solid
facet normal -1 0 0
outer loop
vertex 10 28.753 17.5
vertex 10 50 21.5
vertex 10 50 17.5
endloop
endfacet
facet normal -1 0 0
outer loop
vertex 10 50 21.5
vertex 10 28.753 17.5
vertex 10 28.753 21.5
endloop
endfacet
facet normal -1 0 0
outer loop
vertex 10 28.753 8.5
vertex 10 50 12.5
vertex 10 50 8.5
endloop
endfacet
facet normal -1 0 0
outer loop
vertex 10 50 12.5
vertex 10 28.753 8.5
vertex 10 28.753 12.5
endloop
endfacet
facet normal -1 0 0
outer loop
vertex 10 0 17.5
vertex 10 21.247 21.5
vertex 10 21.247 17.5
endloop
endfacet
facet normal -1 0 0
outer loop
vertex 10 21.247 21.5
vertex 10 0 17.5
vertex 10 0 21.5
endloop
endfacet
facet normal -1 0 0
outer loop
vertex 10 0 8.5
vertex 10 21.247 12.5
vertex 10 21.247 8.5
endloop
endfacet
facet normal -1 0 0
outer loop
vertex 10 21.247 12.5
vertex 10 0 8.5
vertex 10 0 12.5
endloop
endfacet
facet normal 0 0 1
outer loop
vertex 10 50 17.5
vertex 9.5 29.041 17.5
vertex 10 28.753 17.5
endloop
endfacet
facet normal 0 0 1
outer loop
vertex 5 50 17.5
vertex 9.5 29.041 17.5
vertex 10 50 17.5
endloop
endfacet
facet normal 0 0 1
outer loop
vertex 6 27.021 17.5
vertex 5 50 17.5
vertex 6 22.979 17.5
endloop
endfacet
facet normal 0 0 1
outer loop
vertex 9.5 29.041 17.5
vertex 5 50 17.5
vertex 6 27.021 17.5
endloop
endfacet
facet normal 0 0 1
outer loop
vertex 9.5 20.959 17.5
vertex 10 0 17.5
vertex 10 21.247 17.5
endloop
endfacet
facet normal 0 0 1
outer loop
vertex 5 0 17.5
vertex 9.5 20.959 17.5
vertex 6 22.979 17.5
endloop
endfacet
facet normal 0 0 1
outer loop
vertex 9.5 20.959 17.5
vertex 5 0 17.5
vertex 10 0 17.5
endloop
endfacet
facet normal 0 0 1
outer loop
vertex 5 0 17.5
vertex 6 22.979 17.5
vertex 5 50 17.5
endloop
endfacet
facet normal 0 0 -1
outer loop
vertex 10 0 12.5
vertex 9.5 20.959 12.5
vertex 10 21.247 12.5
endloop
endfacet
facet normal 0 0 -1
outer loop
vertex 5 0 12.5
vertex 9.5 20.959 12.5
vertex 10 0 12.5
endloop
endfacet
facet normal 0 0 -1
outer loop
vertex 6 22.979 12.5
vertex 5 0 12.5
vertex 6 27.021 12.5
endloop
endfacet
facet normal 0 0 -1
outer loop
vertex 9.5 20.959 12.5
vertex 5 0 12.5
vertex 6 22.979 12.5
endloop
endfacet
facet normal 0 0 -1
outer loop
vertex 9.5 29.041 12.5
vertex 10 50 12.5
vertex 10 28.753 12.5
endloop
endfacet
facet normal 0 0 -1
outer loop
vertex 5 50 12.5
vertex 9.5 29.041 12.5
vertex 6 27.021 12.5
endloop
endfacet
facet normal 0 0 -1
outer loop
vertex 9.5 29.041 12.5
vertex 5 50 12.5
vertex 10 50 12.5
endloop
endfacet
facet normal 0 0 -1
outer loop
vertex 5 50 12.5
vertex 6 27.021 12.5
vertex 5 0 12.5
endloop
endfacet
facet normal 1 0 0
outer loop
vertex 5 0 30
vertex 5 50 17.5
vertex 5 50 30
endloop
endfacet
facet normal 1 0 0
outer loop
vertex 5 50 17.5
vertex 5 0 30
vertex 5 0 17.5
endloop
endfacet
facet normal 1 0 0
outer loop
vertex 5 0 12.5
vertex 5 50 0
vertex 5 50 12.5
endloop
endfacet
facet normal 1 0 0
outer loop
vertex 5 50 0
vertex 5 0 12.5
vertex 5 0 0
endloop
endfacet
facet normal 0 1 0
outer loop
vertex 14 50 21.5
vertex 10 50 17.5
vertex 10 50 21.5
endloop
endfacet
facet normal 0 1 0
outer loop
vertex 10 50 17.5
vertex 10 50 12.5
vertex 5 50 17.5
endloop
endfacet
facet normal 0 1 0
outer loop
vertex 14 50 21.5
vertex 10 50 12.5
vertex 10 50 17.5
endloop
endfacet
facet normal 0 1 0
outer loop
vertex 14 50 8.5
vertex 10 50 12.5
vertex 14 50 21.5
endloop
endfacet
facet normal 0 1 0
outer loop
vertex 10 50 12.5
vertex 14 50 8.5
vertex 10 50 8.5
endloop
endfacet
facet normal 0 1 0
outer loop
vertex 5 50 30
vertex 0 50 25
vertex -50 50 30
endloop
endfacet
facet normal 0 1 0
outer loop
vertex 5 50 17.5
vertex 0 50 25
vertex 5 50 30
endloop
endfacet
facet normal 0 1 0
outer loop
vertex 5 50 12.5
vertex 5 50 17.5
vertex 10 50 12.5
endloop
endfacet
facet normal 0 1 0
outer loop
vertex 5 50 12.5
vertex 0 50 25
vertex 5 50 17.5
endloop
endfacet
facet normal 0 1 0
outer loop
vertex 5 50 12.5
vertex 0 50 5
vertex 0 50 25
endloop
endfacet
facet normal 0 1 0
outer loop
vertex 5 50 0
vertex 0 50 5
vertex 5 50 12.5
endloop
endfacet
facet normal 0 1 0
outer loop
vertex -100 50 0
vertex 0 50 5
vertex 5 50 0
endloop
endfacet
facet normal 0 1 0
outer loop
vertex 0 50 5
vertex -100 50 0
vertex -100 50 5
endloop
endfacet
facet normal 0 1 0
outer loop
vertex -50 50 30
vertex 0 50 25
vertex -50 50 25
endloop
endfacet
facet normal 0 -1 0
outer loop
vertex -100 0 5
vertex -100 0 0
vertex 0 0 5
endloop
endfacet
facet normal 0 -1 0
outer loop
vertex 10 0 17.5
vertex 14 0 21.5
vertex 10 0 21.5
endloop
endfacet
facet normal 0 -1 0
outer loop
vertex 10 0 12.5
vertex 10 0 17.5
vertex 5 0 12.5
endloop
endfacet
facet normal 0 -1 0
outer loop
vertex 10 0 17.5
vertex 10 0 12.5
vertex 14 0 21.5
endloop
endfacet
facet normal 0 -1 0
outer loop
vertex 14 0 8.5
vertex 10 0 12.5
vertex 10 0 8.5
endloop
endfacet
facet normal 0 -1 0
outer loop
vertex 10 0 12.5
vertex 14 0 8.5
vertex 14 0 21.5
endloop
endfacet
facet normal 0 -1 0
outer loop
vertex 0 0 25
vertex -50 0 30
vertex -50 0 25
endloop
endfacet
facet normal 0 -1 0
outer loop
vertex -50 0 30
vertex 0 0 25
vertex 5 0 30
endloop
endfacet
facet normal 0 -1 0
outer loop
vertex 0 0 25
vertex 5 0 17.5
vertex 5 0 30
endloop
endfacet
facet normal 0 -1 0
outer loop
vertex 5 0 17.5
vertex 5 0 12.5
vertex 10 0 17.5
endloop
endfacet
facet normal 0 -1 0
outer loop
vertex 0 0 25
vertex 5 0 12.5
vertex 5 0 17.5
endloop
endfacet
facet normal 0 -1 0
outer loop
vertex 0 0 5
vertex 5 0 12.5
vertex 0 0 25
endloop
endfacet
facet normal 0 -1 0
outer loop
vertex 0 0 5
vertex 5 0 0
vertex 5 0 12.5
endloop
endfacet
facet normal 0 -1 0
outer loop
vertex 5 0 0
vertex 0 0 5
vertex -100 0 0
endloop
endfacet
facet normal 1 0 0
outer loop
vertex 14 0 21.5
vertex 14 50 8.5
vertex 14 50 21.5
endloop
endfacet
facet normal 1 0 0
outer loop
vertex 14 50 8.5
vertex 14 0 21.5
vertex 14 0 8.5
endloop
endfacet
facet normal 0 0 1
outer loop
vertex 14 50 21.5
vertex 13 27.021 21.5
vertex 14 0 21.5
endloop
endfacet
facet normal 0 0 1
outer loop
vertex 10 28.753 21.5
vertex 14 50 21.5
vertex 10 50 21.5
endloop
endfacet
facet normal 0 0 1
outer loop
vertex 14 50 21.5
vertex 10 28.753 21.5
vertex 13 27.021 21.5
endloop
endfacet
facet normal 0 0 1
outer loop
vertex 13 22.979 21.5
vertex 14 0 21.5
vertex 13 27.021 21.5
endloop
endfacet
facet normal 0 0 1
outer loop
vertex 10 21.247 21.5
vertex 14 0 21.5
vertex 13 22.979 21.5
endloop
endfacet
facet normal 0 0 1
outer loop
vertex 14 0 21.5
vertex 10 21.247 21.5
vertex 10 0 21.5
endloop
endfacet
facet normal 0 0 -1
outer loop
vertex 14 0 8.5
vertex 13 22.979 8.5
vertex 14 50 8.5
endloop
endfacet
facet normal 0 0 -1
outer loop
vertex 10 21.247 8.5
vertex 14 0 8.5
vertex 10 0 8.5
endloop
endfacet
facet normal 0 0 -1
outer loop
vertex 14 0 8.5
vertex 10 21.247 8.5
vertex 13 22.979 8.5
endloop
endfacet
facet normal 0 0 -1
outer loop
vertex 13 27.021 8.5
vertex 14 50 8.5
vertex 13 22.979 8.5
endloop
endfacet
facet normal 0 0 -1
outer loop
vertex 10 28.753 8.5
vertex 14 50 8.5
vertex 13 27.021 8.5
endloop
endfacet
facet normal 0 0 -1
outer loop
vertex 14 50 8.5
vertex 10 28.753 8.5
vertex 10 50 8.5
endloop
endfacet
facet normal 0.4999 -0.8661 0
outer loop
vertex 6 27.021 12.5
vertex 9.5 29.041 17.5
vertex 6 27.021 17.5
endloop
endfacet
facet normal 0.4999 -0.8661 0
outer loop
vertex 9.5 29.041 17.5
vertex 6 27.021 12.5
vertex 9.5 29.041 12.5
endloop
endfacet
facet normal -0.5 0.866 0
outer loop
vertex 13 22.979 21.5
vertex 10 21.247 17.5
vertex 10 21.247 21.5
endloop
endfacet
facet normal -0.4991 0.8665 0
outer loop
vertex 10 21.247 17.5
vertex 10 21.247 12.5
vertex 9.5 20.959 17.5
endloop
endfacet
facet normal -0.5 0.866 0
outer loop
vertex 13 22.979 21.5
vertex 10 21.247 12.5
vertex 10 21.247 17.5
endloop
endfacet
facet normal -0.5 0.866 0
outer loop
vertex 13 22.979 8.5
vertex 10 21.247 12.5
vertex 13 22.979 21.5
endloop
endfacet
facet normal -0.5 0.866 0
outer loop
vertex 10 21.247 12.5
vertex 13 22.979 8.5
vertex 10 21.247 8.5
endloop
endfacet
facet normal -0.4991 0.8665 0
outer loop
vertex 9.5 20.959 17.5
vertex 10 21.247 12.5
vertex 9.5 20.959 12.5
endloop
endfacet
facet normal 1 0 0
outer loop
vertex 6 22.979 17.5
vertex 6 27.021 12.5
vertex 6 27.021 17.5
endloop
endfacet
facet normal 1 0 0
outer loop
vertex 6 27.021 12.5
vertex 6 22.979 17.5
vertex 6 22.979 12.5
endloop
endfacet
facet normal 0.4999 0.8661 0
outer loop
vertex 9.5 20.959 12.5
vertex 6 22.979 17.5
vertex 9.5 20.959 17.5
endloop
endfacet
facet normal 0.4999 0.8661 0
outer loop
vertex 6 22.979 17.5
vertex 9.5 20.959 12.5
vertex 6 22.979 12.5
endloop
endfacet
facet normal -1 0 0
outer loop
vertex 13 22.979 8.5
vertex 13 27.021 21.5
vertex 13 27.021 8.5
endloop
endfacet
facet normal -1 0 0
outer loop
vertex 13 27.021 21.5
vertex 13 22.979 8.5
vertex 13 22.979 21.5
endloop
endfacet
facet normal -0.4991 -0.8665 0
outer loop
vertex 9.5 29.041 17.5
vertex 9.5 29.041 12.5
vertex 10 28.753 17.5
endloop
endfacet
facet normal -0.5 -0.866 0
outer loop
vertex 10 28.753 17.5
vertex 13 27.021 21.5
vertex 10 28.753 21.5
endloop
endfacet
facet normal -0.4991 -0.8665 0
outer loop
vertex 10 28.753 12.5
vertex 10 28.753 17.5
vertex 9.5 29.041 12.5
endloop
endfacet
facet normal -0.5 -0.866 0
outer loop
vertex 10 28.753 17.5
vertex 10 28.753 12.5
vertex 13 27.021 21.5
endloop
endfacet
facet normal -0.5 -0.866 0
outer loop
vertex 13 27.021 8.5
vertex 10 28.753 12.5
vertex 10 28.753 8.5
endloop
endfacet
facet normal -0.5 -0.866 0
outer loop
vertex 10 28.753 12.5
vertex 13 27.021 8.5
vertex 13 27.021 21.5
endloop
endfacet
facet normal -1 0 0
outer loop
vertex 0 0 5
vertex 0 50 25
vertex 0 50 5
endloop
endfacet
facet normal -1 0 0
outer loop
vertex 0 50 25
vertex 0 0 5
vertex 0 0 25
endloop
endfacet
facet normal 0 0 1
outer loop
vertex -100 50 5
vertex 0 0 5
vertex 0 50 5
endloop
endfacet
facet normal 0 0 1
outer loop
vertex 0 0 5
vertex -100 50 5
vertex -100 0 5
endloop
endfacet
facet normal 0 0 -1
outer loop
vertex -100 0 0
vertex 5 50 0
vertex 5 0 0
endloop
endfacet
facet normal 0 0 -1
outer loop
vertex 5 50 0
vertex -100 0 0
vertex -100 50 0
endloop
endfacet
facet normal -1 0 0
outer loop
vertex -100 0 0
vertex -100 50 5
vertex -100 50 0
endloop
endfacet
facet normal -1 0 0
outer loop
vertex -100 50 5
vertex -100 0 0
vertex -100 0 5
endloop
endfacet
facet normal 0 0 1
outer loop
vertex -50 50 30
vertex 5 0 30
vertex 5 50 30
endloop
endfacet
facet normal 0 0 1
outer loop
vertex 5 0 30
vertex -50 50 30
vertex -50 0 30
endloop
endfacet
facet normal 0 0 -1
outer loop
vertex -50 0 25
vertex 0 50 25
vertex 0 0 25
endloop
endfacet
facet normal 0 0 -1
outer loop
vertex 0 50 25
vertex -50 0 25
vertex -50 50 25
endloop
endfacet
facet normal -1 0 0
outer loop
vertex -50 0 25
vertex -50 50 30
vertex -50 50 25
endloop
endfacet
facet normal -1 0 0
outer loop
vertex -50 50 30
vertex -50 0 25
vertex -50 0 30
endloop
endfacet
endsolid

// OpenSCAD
width = 20;
bottom_length = 100;
top_length = 50;

translate([bottom_length*-1,0,0]) {
  cube([bottom_length,50,5]);
}
translate([top_length*-1,0,width+5]) {
  cube([top_length,50,5]);
}
translate([0,0,0]) {
  cube([5,50,width+10]);
}
translate([5,0,(width/2)+2.5]) {
  difference() {
    union() {
      cube([5,50,5]);
      translate([5,0,-4]) {
        cube([4,50,13]);
      }
    }
    translate([4.5,25,-5]) {
      rotate(a=[0,0,30]) {
        linear_extrude(height = 15, $fn = 16) {
          circle(r=4.04145189, $fn=6);
        }
      }
    }
  }
}
